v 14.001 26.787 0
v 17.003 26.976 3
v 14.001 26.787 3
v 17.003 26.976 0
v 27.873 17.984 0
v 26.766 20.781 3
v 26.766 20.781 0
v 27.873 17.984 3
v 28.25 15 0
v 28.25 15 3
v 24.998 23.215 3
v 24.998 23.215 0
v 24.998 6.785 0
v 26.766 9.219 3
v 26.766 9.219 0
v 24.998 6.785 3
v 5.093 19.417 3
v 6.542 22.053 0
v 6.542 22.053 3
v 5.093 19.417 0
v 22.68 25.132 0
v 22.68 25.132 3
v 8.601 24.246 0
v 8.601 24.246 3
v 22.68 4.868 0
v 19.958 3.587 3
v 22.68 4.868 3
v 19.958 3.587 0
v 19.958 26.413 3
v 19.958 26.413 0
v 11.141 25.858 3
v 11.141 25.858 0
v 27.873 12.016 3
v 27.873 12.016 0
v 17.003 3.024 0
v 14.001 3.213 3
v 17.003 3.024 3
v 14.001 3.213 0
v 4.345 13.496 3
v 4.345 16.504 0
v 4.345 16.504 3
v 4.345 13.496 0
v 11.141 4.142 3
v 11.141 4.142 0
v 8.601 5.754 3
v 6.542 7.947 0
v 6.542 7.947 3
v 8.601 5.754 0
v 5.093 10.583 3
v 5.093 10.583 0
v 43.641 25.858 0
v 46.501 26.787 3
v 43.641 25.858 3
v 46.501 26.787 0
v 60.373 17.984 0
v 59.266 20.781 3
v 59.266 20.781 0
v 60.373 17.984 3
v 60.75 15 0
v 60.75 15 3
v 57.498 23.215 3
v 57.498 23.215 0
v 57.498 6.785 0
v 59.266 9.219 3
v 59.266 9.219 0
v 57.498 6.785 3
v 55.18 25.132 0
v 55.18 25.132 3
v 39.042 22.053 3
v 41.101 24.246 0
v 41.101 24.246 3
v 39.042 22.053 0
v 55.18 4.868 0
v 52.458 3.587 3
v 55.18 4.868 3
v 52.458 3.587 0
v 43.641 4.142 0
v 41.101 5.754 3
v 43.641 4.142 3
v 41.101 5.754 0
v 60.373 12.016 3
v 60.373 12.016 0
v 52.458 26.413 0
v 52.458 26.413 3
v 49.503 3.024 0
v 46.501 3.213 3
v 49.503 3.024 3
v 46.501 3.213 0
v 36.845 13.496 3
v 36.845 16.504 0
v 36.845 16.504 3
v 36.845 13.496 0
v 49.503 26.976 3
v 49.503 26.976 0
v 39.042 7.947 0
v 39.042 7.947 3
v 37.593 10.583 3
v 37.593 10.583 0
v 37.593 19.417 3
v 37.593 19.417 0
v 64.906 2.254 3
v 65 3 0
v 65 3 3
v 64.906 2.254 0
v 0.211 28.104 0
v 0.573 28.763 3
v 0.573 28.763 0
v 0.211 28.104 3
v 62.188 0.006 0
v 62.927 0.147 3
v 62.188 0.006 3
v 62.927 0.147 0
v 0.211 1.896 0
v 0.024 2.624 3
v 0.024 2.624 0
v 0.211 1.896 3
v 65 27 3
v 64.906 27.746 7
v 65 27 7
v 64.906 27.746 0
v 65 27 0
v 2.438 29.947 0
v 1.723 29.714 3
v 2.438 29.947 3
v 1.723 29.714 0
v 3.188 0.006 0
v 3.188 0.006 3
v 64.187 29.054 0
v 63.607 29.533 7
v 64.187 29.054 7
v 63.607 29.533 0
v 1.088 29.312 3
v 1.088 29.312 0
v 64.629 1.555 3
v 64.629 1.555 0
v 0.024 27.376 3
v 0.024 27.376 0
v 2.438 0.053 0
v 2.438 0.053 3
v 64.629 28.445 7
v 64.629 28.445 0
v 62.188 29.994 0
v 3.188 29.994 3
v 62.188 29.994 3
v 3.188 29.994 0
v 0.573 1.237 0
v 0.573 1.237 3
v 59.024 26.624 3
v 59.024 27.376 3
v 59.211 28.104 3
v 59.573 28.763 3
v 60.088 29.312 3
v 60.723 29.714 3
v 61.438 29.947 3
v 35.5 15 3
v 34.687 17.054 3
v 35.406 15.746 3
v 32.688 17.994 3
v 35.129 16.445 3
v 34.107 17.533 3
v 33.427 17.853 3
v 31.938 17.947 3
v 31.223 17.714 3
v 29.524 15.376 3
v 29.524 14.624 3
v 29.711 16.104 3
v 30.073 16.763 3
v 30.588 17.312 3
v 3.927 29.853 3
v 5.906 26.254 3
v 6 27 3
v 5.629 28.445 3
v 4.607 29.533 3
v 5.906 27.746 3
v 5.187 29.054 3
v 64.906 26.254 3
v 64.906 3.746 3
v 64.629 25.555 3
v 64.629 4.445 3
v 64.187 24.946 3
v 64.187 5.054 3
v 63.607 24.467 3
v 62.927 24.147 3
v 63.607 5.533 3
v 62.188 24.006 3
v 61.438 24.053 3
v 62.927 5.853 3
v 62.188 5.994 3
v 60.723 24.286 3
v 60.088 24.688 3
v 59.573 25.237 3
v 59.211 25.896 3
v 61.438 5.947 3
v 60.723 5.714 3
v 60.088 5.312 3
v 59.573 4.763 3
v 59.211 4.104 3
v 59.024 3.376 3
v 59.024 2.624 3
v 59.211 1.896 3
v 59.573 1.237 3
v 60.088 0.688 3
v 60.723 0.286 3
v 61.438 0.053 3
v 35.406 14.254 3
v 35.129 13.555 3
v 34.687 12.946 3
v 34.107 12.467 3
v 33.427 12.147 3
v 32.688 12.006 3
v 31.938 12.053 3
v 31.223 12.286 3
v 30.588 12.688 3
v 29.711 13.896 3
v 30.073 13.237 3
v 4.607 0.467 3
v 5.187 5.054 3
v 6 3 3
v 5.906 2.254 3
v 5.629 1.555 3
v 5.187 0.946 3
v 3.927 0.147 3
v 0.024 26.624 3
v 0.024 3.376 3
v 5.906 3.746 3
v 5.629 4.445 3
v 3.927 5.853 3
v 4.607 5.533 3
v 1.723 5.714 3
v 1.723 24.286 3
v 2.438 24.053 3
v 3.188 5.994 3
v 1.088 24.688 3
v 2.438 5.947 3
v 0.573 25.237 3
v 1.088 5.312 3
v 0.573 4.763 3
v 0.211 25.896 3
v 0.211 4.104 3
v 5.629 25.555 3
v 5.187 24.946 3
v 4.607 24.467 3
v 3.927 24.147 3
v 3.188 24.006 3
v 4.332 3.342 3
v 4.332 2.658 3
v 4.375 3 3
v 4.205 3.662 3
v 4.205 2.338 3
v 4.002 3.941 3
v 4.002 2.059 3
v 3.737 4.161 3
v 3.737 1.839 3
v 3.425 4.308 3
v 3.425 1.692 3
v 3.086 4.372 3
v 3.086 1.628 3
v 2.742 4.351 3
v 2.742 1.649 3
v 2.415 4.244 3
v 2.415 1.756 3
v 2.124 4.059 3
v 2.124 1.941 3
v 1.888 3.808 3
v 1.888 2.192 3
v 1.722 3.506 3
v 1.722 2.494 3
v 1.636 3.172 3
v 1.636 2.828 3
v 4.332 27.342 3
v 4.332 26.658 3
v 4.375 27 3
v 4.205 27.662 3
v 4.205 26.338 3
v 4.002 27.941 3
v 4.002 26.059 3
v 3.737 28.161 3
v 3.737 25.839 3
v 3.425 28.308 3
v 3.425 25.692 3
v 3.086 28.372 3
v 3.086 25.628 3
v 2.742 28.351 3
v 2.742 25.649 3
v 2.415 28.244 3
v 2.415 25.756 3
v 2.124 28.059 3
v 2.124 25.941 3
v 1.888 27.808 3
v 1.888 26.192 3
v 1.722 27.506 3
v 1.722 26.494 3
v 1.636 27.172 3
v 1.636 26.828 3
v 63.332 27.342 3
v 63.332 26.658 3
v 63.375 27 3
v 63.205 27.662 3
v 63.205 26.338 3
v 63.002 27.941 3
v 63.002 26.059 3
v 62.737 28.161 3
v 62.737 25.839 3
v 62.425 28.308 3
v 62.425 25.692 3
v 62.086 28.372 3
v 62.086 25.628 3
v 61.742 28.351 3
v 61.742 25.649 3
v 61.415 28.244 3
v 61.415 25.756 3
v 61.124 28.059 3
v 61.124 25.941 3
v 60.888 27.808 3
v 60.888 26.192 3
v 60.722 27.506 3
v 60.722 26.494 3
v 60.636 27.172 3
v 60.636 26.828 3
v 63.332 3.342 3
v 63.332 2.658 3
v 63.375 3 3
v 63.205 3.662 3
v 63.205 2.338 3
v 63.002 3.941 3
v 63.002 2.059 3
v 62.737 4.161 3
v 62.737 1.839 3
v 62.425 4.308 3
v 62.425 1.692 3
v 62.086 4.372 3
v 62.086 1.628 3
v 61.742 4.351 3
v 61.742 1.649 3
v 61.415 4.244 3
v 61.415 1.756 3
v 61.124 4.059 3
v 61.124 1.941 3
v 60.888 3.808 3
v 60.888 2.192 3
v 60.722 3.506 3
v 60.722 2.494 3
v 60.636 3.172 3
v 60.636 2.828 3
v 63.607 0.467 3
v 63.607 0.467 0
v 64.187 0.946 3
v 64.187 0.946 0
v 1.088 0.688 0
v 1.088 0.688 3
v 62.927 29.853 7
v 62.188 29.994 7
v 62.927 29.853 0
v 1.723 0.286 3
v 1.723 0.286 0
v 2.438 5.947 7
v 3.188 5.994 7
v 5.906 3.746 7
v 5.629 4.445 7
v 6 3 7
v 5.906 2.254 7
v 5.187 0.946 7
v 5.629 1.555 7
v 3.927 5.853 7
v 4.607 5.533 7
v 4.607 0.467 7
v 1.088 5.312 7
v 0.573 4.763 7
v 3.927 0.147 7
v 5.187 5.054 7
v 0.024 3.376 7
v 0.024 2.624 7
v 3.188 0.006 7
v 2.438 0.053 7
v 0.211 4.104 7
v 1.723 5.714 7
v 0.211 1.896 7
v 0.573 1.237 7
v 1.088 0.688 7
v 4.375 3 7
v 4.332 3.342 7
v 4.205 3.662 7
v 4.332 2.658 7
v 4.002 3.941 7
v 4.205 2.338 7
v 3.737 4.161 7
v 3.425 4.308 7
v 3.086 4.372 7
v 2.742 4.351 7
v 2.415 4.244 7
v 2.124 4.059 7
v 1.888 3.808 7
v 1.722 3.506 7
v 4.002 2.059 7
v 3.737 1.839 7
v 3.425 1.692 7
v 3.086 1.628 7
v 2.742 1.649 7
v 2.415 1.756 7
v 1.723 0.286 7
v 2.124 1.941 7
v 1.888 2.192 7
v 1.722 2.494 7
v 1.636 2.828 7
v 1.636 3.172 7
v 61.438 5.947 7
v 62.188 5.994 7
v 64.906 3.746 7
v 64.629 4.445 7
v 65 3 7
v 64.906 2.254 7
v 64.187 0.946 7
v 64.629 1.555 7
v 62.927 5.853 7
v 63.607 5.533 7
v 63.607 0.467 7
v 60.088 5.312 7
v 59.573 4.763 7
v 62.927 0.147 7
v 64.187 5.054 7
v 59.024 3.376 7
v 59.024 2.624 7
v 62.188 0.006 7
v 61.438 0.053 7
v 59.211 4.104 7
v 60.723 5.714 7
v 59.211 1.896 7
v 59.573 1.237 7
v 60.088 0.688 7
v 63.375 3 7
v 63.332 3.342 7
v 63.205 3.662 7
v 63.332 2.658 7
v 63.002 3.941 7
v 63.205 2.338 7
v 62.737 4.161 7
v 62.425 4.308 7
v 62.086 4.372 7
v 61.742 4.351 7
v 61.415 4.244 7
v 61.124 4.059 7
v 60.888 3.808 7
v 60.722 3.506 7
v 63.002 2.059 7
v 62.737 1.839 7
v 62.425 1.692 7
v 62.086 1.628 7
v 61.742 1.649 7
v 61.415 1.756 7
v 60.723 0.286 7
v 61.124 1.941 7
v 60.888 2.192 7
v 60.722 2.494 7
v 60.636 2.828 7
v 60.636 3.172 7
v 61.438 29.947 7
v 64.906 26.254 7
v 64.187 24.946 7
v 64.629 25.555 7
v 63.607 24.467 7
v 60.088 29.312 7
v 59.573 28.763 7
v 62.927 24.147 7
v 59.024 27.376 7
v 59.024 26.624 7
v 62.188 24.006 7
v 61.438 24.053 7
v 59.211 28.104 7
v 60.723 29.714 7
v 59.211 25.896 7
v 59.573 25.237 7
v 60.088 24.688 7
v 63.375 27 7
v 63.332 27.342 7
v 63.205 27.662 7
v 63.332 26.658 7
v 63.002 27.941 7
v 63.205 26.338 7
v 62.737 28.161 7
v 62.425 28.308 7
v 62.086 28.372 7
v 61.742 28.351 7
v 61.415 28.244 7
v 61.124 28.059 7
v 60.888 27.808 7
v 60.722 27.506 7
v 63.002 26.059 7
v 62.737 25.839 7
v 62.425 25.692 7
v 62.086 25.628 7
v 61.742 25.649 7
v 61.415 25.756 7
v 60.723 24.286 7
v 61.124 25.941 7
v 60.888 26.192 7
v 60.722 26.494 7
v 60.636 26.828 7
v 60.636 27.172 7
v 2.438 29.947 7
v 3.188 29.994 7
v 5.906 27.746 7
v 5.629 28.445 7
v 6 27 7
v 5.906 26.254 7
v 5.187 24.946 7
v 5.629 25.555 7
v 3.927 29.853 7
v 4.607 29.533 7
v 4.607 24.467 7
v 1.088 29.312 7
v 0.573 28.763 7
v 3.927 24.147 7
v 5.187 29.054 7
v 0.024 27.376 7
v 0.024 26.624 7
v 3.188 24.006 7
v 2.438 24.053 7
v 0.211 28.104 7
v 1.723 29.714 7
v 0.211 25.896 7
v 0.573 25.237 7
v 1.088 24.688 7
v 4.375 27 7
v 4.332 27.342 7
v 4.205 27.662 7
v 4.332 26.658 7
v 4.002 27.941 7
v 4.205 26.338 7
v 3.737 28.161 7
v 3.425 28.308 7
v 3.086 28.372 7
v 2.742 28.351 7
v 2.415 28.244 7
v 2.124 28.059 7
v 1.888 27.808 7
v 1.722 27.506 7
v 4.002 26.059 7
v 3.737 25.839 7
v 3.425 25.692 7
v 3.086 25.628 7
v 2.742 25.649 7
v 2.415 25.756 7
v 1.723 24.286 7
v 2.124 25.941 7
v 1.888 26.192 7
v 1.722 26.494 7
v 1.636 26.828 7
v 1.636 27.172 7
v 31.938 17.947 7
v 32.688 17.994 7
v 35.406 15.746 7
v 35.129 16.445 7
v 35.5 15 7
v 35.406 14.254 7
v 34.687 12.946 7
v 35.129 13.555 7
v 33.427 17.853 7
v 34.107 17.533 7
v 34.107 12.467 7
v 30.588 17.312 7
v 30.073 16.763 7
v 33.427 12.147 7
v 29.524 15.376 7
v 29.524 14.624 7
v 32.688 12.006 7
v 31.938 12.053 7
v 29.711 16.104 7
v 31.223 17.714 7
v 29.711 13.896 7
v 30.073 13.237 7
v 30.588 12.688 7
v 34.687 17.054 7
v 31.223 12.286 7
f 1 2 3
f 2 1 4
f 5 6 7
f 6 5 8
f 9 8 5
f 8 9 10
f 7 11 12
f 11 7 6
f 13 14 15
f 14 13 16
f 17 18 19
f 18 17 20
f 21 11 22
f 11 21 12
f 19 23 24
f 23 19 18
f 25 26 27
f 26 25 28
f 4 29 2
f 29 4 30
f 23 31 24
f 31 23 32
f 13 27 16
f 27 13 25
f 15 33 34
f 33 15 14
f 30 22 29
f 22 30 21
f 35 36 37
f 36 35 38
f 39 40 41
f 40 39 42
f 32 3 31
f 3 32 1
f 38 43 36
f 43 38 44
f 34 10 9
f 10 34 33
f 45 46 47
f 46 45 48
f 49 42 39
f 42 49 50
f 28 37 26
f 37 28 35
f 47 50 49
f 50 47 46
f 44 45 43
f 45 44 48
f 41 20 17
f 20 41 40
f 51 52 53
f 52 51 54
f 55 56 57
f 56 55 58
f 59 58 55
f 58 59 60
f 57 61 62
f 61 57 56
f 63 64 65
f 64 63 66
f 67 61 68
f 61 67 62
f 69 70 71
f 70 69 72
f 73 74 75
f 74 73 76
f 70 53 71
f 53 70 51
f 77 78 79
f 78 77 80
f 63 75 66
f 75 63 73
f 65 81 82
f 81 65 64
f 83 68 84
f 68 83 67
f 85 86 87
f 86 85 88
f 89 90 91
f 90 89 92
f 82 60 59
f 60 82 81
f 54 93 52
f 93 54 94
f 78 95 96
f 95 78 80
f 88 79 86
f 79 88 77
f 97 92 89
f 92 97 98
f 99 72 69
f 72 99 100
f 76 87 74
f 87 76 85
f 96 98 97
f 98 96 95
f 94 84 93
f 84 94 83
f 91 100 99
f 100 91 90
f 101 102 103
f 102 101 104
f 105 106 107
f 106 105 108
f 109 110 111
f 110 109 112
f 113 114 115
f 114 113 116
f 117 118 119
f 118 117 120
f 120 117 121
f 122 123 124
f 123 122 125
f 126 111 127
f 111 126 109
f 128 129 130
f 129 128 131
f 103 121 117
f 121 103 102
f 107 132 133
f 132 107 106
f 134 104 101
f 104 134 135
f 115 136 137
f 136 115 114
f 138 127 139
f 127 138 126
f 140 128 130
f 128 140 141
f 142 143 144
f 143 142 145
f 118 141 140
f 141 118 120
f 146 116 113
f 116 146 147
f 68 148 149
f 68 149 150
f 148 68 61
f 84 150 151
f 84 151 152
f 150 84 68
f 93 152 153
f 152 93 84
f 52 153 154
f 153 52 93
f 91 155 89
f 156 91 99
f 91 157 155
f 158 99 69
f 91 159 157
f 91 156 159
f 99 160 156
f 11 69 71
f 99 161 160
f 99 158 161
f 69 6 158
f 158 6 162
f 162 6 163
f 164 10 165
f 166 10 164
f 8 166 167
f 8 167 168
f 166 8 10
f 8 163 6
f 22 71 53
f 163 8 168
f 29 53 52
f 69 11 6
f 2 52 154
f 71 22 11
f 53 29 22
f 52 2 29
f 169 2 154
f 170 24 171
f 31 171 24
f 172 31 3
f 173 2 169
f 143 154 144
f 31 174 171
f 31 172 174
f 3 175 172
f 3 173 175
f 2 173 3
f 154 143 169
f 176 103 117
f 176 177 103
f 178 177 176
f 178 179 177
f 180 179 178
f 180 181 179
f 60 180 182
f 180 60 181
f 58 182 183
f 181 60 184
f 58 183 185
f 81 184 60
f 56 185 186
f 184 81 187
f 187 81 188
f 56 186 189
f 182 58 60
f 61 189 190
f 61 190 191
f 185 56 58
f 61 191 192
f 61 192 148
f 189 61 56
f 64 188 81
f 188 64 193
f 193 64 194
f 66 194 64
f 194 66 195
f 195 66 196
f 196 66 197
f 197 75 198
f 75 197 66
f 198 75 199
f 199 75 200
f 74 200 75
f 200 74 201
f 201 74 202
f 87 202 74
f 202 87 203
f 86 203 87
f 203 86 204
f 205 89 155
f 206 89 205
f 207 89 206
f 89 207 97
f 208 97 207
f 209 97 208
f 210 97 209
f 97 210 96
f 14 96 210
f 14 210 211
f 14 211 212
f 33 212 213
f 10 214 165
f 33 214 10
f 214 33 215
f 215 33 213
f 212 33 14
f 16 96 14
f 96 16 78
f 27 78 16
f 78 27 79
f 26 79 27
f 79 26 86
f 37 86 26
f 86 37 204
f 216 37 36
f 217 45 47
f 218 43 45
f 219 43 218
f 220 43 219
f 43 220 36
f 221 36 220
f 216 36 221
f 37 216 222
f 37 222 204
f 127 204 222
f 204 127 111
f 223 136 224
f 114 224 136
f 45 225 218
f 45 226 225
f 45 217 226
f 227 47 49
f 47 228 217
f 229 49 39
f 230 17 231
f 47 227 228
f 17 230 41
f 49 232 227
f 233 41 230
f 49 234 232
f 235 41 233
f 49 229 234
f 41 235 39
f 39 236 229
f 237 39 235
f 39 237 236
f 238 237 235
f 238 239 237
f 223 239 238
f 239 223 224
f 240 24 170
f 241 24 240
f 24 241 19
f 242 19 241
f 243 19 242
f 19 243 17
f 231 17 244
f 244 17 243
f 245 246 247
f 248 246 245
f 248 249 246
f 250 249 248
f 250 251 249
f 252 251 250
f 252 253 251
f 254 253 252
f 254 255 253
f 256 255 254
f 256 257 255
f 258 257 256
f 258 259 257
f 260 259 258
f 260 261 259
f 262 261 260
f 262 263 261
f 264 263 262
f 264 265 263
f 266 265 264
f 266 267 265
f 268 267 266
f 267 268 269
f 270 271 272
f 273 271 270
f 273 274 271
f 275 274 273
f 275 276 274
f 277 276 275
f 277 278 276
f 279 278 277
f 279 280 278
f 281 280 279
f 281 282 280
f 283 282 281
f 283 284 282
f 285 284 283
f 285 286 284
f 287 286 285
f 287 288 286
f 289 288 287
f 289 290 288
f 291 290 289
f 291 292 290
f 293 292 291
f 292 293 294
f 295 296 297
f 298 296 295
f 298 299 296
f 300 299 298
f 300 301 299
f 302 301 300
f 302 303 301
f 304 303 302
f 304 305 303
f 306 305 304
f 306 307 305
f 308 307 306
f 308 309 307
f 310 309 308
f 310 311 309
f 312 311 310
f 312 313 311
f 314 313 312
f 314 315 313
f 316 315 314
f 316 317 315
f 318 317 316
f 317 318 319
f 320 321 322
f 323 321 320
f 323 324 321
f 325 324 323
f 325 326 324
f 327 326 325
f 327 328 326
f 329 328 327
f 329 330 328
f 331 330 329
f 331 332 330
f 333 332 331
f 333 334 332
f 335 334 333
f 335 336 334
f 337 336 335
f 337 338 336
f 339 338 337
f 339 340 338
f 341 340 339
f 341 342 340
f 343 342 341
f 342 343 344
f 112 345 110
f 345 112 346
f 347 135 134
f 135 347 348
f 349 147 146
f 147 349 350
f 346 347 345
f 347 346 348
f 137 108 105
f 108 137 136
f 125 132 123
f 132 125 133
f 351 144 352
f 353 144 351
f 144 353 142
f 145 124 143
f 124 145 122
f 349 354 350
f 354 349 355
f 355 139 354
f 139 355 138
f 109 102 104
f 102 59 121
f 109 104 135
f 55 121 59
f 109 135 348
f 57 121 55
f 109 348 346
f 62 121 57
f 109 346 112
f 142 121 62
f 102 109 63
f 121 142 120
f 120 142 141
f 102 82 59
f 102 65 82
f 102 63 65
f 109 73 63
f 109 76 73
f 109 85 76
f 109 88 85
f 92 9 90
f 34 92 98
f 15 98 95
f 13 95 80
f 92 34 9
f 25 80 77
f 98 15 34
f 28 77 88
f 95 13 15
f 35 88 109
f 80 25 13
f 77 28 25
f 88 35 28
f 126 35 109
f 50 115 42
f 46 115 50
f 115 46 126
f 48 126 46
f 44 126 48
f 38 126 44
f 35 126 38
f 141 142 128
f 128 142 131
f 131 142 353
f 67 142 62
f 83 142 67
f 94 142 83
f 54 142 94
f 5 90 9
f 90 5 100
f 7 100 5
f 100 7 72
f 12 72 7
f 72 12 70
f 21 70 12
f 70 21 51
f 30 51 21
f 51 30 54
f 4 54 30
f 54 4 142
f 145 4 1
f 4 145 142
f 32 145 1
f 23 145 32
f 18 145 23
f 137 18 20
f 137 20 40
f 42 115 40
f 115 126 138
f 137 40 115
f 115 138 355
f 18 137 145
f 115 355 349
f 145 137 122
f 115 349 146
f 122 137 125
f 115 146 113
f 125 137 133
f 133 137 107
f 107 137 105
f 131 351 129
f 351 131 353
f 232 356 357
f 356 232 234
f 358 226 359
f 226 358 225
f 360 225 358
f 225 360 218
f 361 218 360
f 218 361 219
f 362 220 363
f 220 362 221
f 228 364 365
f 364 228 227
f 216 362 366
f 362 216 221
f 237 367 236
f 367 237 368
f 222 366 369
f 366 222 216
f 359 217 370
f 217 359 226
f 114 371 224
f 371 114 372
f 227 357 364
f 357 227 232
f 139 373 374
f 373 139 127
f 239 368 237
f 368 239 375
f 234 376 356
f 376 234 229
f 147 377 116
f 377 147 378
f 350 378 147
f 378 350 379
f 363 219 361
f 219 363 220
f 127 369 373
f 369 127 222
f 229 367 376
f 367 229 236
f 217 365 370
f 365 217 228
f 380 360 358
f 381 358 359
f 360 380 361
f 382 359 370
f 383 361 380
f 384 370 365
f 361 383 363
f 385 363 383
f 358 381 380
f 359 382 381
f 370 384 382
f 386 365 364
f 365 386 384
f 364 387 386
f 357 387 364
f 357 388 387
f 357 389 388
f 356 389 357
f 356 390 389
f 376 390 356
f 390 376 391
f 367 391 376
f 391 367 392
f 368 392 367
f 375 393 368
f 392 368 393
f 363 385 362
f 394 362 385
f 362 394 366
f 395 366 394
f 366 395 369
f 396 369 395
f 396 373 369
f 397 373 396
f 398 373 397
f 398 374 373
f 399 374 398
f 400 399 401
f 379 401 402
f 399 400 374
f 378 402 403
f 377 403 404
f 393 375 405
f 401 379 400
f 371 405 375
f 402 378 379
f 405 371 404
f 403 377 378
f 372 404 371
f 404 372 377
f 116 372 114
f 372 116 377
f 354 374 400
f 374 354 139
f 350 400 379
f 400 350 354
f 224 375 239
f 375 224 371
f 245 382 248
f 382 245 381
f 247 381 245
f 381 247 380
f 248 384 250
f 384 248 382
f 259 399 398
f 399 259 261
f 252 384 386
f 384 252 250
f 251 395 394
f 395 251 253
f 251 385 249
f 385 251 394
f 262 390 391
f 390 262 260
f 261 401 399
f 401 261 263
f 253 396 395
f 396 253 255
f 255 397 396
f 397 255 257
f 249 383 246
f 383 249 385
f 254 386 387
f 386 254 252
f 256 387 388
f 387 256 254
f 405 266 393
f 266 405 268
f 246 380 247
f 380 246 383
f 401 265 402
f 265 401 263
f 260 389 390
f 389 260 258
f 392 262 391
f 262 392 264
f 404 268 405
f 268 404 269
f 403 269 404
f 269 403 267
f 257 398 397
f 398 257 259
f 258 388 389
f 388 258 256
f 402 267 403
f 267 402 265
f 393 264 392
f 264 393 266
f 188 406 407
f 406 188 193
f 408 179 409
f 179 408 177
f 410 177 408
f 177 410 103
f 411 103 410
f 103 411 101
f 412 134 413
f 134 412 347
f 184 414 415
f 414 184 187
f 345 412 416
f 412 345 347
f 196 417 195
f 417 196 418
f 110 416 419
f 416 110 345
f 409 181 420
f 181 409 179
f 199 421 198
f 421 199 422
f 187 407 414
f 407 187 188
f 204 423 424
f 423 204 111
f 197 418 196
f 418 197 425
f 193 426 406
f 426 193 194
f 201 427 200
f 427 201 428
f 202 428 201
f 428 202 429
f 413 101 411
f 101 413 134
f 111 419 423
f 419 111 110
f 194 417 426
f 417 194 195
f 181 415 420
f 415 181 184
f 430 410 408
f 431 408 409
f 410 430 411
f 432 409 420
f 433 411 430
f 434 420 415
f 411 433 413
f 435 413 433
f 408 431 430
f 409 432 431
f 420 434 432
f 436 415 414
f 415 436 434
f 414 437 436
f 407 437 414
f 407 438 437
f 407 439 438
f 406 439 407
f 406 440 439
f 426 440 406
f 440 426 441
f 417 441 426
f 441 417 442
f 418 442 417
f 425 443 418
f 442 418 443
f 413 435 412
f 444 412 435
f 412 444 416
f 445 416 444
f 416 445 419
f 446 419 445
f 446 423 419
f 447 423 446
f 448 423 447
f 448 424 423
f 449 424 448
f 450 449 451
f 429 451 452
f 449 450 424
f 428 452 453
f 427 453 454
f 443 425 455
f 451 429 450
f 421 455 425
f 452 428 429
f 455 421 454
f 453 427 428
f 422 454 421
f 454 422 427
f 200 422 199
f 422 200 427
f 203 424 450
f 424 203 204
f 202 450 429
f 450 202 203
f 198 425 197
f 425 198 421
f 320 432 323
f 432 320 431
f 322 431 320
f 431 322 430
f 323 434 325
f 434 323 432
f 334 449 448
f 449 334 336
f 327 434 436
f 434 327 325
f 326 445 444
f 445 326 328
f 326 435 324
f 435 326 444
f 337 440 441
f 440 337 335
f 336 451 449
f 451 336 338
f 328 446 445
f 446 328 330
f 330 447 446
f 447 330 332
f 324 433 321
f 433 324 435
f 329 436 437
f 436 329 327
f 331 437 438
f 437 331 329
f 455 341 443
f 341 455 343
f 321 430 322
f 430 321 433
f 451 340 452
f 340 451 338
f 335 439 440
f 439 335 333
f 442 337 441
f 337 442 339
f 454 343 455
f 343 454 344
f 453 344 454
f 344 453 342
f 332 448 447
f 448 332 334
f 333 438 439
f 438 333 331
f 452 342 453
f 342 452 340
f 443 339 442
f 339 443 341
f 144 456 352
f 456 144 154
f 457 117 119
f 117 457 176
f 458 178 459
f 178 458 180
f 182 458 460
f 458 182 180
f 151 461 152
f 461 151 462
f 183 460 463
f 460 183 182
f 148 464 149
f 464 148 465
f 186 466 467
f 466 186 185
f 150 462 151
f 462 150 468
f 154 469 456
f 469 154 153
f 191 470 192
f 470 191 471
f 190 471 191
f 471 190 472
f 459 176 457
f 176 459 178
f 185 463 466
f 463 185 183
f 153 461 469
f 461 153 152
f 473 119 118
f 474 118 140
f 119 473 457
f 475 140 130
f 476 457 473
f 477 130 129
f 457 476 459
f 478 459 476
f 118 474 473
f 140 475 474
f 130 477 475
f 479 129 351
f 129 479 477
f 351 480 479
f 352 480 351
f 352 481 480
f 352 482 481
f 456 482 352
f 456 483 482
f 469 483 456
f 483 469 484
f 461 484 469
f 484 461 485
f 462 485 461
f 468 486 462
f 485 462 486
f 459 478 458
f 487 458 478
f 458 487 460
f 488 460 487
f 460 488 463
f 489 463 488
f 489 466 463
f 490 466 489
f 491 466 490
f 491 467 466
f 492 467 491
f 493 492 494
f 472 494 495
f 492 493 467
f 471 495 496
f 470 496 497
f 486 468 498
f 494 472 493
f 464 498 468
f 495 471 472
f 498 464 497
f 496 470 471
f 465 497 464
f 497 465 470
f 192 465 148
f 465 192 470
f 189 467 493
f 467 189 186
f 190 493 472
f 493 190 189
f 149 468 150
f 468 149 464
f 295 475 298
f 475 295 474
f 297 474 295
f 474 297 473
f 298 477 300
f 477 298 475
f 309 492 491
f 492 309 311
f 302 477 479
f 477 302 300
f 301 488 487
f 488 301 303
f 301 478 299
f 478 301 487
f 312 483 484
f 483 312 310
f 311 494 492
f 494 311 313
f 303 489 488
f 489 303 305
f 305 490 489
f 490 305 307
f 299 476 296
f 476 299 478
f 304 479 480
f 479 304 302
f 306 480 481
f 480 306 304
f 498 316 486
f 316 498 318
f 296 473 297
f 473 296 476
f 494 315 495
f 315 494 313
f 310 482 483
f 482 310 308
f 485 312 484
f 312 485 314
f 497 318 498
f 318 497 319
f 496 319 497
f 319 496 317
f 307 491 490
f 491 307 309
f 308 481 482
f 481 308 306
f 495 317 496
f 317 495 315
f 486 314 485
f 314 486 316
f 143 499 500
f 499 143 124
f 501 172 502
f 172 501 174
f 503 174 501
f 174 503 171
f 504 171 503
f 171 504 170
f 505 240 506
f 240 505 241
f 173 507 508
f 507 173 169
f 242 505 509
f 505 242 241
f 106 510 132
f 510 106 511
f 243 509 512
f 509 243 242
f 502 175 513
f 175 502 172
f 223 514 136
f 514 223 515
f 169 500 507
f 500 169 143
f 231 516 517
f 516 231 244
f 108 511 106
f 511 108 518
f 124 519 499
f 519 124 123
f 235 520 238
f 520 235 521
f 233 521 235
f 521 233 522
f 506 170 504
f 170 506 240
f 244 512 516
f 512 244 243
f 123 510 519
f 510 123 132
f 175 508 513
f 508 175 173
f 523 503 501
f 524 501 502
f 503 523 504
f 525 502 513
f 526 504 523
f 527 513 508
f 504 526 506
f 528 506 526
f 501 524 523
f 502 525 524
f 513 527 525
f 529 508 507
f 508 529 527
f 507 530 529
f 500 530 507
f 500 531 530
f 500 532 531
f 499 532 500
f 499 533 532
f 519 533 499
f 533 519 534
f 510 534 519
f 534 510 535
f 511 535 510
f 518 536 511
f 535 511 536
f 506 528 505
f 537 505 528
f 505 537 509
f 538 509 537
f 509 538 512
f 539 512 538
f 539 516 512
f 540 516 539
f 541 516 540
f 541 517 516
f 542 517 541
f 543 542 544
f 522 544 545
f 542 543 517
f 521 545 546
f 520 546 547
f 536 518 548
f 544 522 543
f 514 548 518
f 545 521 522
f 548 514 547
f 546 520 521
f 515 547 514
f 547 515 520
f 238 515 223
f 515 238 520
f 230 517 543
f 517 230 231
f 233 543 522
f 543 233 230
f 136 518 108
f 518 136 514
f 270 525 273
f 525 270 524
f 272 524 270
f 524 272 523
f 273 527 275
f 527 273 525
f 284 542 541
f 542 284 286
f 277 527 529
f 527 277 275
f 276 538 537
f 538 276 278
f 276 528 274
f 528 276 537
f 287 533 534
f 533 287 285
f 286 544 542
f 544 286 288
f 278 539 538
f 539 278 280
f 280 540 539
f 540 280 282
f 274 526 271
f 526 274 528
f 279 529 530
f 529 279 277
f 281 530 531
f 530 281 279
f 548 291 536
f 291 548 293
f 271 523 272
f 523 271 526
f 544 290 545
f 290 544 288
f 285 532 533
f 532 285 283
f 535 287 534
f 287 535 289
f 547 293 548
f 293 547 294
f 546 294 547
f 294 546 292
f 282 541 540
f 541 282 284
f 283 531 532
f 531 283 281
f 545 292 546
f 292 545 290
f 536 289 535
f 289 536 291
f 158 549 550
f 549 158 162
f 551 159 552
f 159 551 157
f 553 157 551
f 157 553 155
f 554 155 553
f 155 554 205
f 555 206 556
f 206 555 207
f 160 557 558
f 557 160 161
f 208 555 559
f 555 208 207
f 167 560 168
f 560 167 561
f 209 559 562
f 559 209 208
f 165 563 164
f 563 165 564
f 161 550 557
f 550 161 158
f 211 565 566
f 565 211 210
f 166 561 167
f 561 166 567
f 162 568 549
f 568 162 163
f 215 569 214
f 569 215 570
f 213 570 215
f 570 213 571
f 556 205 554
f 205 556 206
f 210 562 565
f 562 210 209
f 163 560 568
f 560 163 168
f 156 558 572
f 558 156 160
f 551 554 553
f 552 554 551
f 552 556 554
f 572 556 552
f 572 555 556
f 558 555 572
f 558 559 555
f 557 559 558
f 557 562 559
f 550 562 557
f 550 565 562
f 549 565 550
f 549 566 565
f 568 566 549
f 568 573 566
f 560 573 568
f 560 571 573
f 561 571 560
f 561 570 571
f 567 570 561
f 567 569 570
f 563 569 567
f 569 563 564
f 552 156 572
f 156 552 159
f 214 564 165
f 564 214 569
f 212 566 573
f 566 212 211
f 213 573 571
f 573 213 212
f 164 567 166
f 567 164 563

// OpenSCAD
//
// https://blog.prusaprinters.org/parametric-design-in-openscad_8758/
module rounded_plate(x, y, thickness, radius) {
    hull() {
        translate([radius, radius]) cylinder(r = radius, h = thickness, $fn=25);
        translate([x - radius, radius]) cylinder(r = radius, h = thickness, $fn=25);
        translate([x - radius, y - radius]) cylinder(r = radius, h = thickness, $fn=25);
        translate([radius, y - radius]) cylinder(r = radius, h = thickness, $fn=25);
    }
}
module four_posts(x, y, thickness, radius, r2) {
    translate([radius, radius]) difference() { 
        cylinder(r = radius, h = thickness, $fn=25);
        cylinder(r = r2, h = thickness+0.1, $fn=25);
    }
    translate([x - radius, radius]) difference() { 
        cylinder(r = radius, h = thickness, $fn=25);
        cylinder(r = r2, h = thickness+0.1, $fn=25);
    }
    translate([x - radius, y - radius]) difference() { 
        cylinder(r = radius, h = thickness, $fn=25);
        cylinder(r = r2, h = thickness+0.1, $fn=25);
    }
    translate([radius, y - radius]) difference() { 
        cylinder(r = radius, h = thickness, $fn=25);
        cylinder(r = r2, h = thickness+0.1, $fn=25);
    }
}

module support(x, y, thickness, radius) {
    translate([x, y])
        cylinder(r = radius, h = thickness, $fn=25);
    
}

pizero_x = 65;
pizero_y = 30;
corner_r = 3;
hole_d = 2.75;
hole_r = hole_d / 2;
plate_height = 3;
cut_off = 0.1;
support_height = plate_height + 4;

// Basic Raspberry Pi support
difference() {
    rounded_plate(pizero_x, pizero_y, plate_height, 3);
    
    // remove some material - to make it lighter
    translate([0,0,-0.1]) union() {
        support(pizero_x/4, pizero_y/2, plate_height+0.2, 12);
        support(pizero_x/4*3, pizero_y/2, plate_height+0.2, 12);
    }
}
four_posts(pizero_x, pizero_y, support_height, 3, hole_r);
support(pizero_x/2, pizero_y/2, support_height, 3);

// Connection to UK MARS Bot
